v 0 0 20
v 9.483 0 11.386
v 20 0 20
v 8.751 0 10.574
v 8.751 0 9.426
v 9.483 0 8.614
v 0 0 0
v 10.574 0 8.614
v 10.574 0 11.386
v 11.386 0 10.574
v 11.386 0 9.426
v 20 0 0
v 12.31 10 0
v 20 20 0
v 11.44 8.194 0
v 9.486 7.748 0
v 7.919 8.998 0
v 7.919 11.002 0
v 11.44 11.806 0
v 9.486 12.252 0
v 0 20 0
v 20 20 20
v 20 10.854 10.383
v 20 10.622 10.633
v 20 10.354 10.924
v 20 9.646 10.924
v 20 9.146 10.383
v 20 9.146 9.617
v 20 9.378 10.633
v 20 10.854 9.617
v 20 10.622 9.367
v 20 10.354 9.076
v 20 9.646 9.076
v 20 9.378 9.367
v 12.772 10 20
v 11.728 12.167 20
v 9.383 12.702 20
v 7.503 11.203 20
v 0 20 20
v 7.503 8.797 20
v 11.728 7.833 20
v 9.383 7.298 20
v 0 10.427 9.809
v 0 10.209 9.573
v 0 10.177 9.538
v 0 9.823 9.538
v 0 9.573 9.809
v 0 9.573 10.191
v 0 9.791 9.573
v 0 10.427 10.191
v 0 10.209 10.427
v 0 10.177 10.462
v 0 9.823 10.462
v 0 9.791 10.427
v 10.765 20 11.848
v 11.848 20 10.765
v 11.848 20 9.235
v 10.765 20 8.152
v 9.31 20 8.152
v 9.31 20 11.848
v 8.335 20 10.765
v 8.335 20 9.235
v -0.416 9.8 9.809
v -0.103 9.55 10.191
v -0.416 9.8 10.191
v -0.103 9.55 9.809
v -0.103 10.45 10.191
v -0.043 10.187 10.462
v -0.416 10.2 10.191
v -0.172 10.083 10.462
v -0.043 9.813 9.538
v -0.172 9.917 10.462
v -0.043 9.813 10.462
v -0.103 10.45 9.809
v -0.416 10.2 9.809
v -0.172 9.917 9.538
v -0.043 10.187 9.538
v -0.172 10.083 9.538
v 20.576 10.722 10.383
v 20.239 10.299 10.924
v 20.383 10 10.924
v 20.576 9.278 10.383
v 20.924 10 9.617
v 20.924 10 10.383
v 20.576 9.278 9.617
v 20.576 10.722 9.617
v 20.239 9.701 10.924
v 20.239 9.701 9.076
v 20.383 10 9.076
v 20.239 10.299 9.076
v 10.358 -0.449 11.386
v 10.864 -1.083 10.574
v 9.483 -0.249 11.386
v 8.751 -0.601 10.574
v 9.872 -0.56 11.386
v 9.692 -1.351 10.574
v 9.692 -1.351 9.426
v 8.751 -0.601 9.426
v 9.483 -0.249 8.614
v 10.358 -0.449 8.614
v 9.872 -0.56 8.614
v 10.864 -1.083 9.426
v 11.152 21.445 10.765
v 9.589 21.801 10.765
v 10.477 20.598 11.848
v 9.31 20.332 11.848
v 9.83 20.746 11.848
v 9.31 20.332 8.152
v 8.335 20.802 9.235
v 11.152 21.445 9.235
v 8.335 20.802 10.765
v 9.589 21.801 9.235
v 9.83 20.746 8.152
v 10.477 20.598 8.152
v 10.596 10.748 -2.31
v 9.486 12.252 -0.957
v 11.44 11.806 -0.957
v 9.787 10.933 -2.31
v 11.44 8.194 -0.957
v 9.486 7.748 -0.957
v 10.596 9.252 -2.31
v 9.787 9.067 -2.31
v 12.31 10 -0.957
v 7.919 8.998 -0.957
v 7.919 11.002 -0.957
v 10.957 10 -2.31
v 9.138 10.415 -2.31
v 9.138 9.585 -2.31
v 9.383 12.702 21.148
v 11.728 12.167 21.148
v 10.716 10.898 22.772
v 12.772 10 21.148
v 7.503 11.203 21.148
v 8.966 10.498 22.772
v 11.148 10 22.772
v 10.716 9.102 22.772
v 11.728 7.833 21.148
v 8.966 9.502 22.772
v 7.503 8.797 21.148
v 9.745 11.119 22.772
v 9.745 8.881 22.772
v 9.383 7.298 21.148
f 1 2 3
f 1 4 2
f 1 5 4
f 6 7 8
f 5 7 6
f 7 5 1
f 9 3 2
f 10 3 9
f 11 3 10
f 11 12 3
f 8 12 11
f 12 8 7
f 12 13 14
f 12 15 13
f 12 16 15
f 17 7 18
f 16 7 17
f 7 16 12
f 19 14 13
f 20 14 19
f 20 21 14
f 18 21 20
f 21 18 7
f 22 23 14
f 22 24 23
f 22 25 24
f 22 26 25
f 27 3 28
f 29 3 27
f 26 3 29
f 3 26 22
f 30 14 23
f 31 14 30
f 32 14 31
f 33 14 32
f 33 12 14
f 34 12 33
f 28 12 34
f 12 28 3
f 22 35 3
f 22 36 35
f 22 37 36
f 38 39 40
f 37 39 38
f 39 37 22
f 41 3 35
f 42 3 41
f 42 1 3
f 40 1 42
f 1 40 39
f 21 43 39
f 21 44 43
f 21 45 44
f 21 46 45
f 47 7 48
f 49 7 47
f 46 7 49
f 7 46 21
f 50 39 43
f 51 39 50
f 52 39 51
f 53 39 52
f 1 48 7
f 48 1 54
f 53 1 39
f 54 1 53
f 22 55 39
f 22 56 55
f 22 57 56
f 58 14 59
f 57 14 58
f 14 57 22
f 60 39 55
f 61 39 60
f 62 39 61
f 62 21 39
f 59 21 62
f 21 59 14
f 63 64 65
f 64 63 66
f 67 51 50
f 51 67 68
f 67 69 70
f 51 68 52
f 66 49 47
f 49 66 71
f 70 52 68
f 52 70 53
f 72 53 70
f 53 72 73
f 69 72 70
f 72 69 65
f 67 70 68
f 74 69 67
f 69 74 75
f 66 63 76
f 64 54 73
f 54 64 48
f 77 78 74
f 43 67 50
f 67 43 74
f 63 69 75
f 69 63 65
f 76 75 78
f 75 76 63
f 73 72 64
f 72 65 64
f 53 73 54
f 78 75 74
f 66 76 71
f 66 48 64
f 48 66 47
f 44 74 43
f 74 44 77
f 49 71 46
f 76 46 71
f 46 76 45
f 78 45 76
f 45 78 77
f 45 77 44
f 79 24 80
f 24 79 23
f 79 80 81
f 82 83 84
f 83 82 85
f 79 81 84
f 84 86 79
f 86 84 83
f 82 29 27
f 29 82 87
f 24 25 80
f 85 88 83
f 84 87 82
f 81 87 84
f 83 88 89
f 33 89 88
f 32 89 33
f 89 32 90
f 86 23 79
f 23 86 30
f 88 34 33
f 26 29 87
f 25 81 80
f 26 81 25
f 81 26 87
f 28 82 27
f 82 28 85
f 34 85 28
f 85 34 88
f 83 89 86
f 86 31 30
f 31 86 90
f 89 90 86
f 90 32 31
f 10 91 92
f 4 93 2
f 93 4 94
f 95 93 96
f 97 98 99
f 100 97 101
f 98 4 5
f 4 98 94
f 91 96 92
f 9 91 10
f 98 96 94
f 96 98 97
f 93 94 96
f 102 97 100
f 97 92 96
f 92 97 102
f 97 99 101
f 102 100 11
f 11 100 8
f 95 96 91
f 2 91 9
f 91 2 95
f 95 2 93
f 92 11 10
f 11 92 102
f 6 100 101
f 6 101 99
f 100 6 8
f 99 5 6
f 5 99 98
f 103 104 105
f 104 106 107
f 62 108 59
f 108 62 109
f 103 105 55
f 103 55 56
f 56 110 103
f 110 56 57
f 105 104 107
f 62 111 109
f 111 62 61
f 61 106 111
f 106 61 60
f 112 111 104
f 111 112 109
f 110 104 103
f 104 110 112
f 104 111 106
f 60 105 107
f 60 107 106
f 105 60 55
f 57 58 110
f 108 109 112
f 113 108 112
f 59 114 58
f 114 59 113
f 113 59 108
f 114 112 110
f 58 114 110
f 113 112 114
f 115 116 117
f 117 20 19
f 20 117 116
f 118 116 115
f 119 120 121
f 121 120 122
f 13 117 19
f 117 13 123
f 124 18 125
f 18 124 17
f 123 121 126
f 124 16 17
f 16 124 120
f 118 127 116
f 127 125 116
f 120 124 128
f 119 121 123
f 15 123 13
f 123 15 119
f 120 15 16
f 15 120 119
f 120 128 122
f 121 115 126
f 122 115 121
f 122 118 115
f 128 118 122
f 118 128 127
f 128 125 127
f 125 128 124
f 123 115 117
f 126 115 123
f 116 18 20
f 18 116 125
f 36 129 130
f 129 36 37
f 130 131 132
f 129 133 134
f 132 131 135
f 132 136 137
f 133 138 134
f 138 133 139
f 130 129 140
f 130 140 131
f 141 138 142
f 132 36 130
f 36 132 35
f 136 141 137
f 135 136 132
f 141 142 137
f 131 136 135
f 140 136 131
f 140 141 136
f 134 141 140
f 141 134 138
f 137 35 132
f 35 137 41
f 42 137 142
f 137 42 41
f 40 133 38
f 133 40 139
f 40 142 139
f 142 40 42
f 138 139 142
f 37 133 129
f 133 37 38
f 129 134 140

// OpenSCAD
$fn=7;
union()
{
	hull()
	{
		hull()
		{
			translate([0,0,0])
			{
				rotate(0,[0,0,1])
				{
					cube([3,3,3]);
				}
			}
			translate([0,17,0])
			{
				rotate(0,[0,0,1])
				{
					cube([3,3,3]);
				}
			}
			translate([17,17,0])
			{
				rotate(0,[0,0,1])
				{
					cube([3,3,3]);
				}
			}
			translate([17,0,0])
			{
				rotate(0,[0,0,1])
				{
					cube([3,3,3]);
				}
			}
		}
		hull()
		{
			translate([0,0,17])
			{
				rotate(0,[0,0,1])
				{
					cube([3,3,3]);
				}
			}
			translate([0,17,17])
			{
				rotate(0,[0,0,1])
				{
					cube([3,3,3]);
				}
			}
			translate([17,17,17])
			{
				rotate(0,[0,0,1])
				{
					cube([3,3,3]);
				}
			}
			translate([17,0,17])
			{
				rotate(0,[0,0,1])
				{
					cube([3,3,3]);
				}
			}
		}
	}
	translate([0,10,10])
	{
		rotate(0,[0,0,1])
		{
			sphere(d=1);
		}
	}
	translate([20,10,10])
	{
		rotate(0,[0,0,1])
		{
			sphere(d=2);
		}
	}
	translate([10,0,10])
	{
		rotate(0,[0,0,1])
		{
			sphere(d=3);
		}
	}
	translate([10,20,10])
	{
		rotate(0,[0,0,1])
		{
			sphere(d=4);
		}
	}
	translate([10,10,0])
	{
		rotate(0,[0,0,1])
		{
			sphere(d=5);
		}
	}
	translate([10,10,20])
	{
		rotate(0,[0,0,1])
		{
			sphere(d=6);
		}
	}
}
